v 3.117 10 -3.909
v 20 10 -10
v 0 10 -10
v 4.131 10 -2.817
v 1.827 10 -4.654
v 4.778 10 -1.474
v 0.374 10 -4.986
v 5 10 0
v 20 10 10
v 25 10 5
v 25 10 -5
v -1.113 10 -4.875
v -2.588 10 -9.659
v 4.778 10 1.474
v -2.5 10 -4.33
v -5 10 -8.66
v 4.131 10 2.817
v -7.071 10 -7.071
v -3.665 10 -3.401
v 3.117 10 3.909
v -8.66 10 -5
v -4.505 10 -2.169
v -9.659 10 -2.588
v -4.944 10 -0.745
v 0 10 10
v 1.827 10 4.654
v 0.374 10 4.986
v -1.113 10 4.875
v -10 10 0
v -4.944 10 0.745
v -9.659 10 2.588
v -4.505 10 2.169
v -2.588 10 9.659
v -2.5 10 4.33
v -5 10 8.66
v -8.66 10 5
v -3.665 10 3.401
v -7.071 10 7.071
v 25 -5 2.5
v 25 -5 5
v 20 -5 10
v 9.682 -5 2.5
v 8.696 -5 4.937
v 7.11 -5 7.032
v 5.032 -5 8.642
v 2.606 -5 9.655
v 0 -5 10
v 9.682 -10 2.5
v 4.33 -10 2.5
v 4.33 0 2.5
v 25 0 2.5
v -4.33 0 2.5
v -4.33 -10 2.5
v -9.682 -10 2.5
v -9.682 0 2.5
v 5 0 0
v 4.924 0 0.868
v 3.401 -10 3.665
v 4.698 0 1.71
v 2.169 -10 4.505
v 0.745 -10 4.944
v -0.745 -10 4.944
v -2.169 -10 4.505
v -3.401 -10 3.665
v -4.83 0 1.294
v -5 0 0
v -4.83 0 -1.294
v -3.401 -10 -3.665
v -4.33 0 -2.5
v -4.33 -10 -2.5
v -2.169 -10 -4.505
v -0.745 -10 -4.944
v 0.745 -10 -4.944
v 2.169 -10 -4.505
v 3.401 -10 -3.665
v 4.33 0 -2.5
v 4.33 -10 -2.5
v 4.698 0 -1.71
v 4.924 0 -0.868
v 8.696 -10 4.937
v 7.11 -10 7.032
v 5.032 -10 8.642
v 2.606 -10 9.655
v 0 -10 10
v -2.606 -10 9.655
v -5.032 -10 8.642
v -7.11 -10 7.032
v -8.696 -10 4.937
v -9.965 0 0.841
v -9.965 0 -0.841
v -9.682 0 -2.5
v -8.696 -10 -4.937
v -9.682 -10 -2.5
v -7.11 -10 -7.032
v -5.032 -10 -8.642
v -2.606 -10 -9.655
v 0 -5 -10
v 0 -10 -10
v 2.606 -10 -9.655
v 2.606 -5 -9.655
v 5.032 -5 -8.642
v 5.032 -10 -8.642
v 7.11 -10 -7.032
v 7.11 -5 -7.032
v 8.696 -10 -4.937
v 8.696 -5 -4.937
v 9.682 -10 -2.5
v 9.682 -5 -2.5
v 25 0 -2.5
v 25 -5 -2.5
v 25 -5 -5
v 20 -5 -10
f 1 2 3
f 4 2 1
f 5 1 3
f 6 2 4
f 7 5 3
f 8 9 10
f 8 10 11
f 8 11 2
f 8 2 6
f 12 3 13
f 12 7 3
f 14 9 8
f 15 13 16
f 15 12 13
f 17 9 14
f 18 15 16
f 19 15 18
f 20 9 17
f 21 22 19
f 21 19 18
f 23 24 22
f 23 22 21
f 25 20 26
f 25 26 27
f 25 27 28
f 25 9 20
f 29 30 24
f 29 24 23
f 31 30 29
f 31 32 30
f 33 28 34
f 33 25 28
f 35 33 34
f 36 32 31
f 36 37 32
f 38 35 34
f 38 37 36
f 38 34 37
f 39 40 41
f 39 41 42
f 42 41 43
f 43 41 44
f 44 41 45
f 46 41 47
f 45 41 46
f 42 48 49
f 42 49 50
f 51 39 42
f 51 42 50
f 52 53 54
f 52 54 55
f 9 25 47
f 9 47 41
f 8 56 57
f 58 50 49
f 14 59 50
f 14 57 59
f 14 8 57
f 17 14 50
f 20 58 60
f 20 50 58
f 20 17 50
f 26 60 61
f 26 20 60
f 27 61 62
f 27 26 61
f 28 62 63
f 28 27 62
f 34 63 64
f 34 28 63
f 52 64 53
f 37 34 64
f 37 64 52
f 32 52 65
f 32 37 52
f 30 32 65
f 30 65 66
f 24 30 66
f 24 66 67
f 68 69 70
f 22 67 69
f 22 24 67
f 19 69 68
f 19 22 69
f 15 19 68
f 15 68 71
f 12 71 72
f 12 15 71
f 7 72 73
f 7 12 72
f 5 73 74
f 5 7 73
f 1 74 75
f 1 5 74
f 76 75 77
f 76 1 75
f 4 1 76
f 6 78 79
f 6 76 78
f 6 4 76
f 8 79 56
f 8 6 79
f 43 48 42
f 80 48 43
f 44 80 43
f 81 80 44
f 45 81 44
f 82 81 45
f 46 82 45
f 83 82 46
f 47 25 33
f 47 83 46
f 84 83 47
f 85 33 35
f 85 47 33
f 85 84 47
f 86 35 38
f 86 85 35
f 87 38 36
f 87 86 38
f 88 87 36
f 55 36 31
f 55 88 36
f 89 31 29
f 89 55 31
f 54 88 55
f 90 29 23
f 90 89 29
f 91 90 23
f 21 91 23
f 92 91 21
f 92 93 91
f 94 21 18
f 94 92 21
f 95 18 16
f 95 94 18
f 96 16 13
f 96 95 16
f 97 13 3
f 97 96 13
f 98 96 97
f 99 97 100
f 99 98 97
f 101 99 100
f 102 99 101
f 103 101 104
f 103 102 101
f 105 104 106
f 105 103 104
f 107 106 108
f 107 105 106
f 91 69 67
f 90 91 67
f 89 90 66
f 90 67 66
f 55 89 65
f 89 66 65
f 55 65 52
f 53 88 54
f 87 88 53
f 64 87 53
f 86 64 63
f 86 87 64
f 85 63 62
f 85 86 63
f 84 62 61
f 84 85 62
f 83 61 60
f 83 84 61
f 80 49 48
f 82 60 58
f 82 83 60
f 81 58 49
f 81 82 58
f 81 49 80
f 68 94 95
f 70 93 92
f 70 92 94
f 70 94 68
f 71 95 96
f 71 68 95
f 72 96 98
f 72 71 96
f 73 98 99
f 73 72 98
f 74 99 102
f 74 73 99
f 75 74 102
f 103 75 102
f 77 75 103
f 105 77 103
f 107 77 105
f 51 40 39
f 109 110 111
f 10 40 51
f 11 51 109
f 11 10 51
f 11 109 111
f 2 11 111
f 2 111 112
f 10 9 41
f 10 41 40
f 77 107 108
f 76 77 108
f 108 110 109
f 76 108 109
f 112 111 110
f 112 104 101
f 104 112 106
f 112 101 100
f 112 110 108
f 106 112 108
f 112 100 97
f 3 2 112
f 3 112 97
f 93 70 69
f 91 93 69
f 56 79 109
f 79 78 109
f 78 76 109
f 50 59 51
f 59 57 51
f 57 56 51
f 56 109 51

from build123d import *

# Parameters (mm, degrees)
F0_R     = 10
F0_R_2   = 5
F1_DEPTH = 10
F3_DEPTH = 15
F4_W     = 10
F4_H     = 5
F5_DEPTH = 35.001


with BuildPart() as f1:
    # F0 (on Front) → F1 (new body, symmetric)
    with BuildSketch(Plane.XZ):
        Circle(F0_R)
        Circle(F0_R_2, mode=Mode.SUBTRACT)
    extrude(amount=F1_DEPTH, both=True)

    # F2 (on face) → F3 (join)
    with BuildSketch(Plane(origin=(0, 10, 0), x_dir=(-1, 0, 0), z_dir=(0, 1, 0))):
        with BuildLine():
            ThreePointArc((0, -10), (-10, 0), (0, 10))
            Line((0, 10), (-20, 10))
            Line((-20, 10), (-25, 5))
            Line((-25, 5), (-25, -5))
            Line((-25, -5), (-20, -10))
            Line((-20, -10), (0, -10))
        make_face()
    extrude(amount=-F3_DEPTH)

    # F4 (on face) → F5 (cut, through all)
    with BuildSketch(Plane.YZ.offset(25)):
        with Locations((-5, 0)):
            Rectangle(F4_W, F4_H)
    extrude(amount=-F5_DEPTH, mode=Mode.SUBTRACT)


solid = f1.part
